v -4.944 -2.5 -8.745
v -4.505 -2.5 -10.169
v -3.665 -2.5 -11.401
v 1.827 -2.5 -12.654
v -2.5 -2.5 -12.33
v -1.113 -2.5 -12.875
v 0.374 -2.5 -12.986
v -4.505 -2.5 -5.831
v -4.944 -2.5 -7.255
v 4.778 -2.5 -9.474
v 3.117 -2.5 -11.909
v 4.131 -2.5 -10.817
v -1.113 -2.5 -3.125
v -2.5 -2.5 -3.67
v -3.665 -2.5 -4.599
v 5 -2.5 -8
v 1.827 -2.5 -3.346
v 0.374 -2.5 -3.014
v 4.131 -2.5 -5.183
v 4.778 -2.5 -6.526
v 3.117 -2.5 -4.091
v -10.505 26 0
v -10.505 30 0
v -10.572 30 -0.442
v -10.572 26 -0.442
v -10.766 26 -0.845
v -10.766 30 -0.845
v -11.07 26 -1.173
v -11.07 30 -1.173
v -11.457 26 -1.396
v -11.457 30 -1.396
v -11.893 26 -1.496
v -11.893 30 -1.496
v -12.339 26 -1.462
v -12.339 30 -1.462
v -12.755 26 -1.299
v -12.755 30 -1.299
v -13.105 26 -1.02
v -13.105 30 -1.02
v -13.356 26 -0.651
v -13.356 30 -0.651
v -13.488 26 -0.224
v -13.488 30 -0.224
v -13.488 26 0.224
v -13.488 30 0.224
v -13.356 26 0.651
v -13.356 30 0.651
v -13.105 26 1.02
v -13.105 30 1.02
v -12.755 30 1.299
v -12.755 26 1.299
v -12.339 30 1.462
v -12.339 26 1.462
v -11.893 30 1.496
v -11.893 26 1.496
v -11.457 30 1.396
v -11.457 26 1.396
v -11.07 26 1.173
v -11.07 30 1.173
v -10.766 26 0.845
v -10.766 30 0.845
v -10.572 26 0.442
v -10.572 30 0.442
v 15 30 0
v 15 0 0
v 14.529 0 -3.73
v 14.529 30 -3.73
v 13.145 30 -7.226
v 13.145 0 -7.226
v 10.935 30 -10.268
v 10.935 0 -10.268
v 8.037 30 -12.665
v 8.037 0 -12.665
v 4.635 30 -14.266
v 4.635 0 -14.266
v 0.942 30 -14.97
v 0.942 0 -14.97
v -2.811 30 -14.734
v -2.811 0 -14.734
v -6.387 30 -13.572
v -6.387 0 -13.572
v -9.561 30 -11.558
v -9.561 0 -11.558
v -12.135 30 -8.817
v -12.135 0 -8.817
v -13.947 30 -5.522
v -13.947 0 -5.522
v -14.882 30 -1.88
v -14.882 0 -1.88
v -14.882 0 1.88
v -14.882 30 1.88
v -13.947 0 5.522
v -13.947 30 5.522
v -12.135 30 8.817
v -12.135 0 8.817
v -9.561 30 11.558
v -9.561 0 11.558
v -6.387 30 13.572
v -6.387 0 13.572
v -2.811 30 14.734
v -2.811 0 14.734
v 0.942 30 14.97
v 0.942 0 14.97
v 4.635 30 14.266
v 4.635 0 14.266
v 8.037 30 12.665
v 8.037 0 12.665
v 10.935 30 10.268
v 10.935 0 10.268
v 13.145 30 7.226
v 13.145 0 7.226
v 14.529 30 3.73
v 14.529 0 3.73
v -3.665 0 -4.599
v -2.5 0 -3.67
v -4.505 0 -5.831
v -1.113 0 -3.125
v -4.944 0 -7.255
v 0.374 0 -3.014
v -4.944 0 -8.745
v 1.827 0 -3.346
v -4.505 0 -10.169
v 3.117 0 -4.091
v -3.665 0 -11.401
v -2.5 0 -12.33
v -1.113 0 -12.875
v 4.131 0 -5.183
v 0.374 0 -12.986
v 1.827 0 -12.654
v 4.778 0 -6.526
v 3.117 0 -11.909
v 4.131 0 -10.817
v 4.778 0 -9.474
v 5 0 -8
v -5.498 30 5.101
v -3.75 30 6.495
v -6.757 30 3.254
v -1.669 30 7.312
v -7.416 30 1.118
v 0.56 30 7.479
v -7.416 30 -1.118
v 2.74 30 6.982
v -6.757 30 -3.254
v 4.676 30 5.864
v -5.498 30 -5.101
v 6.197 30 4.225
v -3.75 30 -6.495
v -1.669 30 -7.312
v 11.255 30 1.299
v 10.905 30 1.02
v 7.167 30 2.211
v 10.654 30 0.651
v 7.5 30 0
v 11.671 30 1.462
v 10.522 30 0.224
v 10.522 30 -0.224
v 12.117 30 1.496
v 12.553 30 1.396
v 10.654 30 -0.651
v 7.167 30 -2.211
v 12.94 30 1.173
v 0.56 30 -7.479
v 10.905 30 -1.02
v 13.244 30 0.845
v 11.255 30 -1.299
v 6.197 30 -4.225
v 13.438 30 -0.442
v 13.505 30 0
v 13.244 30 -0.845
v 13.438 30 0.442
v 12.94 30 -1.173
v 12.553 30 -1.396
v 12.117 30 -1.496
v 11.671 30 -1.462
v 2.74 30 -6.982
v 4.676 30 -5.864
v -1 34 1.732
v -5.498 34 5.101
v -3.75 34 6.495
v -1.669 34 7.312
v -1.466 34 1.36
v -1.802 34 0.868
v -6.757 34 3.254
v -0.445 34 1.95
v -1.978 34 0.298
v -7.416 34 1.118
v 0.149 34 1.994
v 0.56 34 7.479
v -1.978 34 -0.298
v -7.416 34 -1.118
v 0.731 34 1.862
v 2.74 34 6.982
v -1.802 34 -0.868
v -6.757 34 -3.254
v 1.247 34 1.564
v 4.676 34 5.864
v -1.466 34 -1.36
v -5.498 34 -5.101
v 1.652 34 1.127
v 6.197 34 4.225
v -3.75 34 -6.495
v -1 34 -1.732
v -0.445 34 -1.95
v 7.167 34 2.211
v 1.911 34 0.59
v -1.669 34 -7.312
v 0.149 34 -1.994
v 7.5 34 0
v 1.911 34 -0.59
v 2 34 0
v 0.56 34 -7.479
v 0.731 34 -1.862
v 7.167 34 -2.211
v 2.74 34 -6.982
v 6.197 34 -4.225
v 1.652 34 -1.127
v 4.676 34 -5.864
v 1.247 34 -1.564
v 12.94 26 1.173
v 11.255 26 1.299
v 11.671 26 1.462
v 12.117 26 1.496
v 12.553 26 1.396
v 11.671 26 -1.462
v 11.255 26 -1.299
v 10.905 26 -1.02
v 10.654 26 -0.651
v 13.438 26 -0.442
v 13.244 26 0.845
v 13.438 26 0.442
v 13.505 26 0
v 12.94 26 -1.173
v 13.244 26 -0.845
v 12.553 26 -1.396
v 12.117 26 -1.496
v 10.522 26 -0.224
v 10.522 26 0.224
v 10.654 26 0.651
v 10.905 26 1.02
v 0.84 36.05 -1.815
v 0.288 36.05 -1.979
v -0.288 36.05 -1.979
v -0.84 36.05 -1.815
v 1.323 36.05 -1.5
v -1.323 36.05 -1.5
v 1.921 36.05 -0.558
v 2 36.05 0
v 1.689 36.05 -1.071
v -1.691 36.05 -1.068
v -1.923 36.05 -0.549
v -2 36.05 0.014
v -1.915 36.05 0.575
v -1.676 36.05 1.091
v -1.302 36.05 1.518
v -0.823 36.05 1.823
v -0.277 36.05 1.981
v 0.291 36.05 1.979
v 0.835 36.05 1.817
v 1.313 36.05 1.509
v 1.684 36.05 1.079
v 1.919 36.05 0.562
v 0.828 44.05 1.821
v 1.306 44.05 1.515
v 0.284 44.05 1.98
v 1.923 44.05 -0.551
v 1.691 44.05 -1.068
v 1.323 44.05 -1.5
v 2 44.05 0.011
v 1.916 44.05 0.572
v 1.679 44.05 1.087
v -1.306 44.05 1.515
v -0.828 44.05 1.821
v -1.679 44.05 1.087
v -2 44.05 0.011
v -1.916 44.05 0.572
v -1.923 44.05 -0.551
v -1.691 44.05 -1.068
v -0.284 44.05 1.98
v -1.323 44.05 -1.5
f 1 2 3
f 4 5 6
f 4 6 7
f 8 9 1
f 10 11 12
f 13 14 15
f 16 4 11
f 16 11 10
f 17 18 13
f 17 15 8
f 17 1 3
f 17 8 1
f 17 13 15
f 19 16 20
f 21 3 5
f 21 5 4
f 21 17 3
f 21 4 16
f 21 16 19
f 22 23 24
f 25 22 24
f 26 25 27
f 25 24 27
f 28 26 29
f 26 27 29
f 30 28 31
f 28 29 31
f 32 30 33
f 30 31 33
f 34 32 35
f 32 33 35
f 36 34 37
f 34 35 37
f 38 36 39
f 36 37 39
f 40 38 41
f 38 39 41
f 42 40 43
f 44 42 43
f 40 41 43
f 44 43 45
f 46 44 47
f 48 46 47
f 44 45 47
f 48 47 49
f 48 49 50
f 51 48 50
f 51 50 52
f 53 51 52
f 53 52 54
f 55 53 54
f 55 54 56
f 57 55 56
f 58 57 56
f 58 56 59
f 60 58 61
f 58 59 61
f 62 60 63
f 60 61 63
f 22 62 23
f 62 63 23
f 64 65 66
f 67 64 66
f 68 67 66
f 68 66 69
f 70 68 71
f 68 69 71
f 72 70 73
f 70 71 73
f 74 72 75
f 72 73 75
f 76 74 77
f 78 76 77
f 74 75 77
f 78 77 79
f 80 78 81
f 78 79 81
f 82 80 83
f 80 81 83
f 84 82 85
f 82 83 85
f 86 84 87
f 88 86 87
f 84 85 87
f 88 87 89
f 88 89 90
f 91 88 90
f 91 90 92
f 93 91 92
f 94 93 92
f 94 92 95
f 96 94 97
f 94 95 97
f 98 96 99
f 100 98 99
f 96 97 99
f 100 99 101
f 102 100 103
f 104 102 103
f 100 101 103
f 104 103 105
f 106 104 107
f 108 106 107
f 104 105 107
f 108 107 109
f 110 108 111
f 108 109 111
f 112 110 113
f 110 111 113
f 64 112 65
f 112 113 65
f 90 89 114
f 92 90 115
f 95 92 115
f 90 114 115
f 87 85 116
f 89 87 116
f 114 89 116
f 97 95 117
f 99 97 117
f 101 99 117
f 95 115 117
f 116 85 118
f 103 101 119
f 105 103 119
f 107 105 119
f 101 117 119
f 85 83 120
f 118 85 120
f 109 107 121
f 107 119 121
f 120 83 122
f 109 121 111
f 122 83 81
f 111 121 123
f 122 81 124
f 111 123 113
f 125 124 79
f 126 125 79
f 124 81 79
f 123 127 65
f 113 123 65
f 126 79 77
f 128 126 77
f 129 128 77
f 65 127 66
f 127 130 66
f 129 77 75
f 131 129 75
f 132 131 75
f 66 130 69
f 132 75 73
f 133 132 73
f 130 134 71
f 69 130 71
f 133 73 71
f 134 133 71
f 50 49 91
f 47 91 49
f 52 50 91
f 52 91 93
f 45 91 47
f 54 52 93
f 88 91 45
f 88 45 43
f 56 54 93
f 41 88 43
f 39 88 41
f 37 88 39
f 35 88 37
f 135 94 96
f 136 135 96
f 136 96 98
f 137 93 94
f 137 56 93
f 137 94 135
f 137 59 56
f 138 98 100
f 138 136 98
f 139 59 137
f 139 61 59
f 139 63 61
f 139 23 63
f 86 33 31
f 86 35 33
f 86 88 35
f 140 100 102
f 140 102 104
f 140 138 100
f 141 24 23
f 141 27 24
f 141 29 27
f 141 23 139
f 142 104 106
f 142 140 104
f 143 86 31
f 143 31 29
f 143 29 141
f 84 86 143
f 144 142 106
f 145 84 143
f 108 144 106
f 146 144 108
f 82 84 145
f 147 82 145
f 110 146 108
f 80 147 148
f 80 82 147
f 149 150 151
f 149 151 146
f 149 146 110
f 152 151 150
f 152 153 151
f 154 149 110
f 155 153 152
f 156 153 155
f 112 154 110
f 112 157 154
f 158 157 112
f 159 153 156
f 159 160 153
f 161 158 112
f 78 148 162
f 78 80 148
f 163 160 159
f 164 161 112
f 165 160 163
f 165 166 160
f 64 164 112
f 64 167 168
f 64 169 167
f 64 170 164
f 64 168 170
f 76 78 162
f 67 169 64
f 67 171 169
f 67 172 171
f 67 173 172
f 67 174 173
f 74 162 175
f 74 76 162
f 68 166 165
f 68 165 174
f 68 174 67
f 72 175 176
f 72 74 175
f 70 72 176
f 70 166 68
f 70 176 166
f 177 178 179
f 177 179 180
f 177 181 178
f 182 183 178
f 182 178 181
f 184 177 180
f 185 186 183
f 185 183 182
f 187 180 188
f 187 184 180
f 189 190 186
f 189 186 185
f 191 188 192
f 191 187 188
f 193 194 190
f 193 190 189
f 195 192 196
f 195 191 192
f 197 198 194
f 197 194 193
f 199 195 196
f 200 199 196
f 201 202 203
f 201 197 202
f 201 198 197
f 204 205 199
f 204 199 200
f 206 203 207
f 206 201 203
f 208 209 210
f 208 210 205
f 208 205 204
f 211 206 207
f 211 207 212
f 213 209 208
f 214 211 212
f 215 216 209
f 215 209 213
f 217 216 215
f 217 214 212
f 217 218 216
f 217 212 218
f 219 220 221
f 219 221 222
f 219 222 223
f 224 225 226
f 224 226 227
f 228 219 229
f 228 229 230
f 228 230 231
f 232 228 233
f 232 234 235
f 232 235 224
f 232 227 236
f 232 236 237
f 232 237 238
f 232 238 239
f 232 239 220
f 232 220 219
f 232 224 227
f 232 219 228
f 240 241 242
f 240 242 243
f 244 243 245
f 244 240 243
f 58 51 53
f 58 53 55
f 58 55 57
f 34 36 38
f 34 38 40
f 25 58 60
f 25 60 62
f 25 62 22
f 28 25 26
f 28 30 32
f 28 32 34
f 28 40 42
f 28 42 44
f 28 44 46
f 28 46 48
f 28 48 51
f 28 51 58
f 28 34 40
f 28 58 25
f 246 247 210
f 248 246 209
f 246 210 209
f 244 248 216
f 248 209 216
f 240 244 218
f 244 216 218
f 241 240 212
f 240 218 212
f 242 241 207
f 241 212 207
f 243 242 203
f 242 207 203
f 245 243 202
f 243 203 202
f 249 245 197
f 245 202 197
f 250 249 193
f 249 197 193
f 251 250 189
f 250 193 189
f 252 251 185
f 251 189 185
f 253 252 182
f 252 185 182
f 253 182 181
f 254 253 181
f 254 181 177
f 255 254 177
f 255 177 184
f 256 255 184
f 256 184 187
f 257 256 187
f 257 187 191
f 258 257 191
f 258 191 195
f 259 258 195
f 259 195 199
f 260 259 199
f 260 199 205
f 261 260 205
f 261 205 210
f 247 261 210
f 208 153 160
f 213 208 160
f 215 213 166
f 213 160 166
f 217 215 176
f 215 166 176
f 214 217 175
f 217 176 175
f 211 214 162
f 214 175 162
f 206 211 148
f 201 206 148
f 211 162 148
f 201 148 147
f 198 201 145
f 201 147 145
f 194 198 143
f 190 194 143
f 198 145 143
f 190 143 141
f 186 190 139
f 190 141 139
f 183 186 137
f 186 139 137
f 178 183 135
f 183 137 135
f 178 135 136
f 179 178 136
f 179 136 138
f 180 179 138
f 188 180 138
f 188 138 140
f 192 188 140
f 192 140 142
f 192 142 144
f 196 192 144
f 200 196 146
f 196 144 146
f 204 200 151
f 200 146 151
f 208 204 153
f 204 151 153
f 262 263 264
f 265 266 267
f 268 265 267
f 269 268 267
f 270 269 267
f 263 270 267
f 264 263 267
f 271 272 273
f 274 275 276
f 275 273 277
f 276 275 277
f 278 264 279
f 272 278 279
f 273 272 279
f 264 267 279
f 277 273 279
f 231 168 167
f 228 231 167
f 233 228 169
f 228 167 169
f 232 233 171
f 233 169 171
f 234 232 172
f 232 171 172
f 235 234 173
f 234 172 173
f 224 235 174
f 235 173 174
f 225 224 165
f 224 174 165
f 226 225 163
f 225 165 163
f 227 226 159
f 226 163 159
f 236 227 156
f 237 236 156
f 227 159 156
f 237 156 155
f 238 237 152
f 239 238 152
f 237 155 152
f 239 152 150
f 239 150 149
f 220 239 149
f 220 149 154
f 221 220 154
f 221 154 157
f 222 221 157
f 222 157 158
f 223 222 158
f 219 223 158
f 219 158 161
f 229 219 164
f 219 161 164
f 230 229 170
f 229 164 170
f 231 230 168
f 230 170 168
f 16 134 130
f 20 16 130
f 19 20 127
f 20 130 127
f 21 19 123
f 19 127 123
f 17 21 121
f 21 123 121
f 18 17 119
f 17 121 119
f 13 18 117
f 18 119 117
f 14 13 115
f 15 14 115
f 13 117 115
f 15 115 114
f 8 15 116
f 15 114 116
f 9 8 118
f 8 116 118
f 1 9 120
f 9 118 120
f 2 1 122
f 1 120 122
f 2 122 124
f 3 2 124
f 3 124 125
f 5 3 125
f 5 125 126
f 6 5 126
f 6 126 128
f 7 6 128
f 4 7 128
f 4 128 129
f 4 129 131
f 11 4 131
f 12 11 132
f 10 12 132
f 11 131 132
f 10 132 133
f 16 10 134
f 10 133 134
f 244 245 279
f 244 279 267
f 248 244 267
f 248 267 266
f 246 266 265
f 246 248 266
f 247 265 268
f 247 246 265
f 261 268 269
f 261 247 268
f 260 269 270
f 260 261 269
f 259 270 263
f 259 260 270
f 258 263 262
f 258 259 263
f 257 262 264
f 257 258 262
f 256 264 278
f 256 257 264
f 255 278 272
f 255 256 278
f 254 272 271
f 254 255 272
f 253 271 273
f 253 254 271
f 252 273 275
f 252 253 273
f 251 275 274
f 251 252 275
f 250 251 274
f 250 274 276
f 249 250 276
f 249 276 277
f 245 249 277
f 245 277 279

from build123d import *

# Parameters (mm, degrees)
SKETCH1_R           = 15
BOSS_EXTRUDE1_DEPTH = 30
SKETCH4_R           = 1.5
CUT_EXTRUDE1_DEPTH  = 4
SKETCH5_R           = 7.5
BOSS_EXTRUDE2_DEPTH = 4
SKETCH6_R           = 2
BOSS_EXTRUDE3_DEPTH = 2.05
BOSS_EXTRUDE4_DEPTH = 8
SKETCH9_R           = 5
BOSS_EXTRUDE5_DEPTH = 2.5


with BuildPart() as part:
    # Sketch1 → Boss-Extrude1 (new body)
    with BuildSketch(Plane(origin=(0, 0, 0), x_dir=(1, 0, 0), z_dir=(0, 1, 0))):
        Circle(SKETCH1_R)
    extrude(amount=BOSS_EXTRUDE1_DEPTH)

    # Sketch4 → Cut-Extrude1 (cut)
    with BuildSketch(Plane(origin=(0, 30, 0), x_dir=(1, 0, 0), z_dir=(0, 1, 0))):
        with Locations((12.005, 0)):
            Circle(SKETCH4_R)
        with Locations((-12.005, 0)):
            Circle(SKETCH4_R)
    extrude(amount=-CUT_EXTRUDE1_DEPTH, mode=Mode.SUBTRACT)

    # Sketch5 → Boss-Extrude2 (add)
    with BuildSketch(Plane(origin=(0, 30, 0), x_dir=(1, 0, 0), z_dir=(0, 1, 0))):
        Circle(SKETCH5_R)
    extrude(amount=BOSS_EXTRUDE2_DEPTH)

    # Sketch6 → Boss-Extrude3 (add)
    with BuildSketch(Plane(origin=(0, 34, 0), x_dir=(1, 0, 0), z_dir=(0, 1, 0))):
        Circle(SKETCH6_R)
    extrude(amount=BOSS_EXTRUDE3_DEPTH)

    # Sketch7 → Boss-Extrude4 (add)
    with BuildSketch(Plane(origin=(0, 36.05, 0), x_dir=(1, 0, 0), z_dir=(0, 1, 0))):
        with BuildLine():
            Line((-1.322875656, 1.5), (1.322875656, 1.5))
            ThreePointArc((1.322875656, 1.5), (0, -2), (-1.322875656, 1.5))
        make_face()
    extrude(amount=BOSS_EXTRUDE4_DEPTH)

    # Sketch9 → Boss-Extrude5 (add)
    with BuildSketch(Plane.XZ):
        with Locations((0, -8)):
            Circle(SKETCH9_R)
    extrude(amount=BOSS_EXTRUDE5_DEPTH)


solid = part.part
